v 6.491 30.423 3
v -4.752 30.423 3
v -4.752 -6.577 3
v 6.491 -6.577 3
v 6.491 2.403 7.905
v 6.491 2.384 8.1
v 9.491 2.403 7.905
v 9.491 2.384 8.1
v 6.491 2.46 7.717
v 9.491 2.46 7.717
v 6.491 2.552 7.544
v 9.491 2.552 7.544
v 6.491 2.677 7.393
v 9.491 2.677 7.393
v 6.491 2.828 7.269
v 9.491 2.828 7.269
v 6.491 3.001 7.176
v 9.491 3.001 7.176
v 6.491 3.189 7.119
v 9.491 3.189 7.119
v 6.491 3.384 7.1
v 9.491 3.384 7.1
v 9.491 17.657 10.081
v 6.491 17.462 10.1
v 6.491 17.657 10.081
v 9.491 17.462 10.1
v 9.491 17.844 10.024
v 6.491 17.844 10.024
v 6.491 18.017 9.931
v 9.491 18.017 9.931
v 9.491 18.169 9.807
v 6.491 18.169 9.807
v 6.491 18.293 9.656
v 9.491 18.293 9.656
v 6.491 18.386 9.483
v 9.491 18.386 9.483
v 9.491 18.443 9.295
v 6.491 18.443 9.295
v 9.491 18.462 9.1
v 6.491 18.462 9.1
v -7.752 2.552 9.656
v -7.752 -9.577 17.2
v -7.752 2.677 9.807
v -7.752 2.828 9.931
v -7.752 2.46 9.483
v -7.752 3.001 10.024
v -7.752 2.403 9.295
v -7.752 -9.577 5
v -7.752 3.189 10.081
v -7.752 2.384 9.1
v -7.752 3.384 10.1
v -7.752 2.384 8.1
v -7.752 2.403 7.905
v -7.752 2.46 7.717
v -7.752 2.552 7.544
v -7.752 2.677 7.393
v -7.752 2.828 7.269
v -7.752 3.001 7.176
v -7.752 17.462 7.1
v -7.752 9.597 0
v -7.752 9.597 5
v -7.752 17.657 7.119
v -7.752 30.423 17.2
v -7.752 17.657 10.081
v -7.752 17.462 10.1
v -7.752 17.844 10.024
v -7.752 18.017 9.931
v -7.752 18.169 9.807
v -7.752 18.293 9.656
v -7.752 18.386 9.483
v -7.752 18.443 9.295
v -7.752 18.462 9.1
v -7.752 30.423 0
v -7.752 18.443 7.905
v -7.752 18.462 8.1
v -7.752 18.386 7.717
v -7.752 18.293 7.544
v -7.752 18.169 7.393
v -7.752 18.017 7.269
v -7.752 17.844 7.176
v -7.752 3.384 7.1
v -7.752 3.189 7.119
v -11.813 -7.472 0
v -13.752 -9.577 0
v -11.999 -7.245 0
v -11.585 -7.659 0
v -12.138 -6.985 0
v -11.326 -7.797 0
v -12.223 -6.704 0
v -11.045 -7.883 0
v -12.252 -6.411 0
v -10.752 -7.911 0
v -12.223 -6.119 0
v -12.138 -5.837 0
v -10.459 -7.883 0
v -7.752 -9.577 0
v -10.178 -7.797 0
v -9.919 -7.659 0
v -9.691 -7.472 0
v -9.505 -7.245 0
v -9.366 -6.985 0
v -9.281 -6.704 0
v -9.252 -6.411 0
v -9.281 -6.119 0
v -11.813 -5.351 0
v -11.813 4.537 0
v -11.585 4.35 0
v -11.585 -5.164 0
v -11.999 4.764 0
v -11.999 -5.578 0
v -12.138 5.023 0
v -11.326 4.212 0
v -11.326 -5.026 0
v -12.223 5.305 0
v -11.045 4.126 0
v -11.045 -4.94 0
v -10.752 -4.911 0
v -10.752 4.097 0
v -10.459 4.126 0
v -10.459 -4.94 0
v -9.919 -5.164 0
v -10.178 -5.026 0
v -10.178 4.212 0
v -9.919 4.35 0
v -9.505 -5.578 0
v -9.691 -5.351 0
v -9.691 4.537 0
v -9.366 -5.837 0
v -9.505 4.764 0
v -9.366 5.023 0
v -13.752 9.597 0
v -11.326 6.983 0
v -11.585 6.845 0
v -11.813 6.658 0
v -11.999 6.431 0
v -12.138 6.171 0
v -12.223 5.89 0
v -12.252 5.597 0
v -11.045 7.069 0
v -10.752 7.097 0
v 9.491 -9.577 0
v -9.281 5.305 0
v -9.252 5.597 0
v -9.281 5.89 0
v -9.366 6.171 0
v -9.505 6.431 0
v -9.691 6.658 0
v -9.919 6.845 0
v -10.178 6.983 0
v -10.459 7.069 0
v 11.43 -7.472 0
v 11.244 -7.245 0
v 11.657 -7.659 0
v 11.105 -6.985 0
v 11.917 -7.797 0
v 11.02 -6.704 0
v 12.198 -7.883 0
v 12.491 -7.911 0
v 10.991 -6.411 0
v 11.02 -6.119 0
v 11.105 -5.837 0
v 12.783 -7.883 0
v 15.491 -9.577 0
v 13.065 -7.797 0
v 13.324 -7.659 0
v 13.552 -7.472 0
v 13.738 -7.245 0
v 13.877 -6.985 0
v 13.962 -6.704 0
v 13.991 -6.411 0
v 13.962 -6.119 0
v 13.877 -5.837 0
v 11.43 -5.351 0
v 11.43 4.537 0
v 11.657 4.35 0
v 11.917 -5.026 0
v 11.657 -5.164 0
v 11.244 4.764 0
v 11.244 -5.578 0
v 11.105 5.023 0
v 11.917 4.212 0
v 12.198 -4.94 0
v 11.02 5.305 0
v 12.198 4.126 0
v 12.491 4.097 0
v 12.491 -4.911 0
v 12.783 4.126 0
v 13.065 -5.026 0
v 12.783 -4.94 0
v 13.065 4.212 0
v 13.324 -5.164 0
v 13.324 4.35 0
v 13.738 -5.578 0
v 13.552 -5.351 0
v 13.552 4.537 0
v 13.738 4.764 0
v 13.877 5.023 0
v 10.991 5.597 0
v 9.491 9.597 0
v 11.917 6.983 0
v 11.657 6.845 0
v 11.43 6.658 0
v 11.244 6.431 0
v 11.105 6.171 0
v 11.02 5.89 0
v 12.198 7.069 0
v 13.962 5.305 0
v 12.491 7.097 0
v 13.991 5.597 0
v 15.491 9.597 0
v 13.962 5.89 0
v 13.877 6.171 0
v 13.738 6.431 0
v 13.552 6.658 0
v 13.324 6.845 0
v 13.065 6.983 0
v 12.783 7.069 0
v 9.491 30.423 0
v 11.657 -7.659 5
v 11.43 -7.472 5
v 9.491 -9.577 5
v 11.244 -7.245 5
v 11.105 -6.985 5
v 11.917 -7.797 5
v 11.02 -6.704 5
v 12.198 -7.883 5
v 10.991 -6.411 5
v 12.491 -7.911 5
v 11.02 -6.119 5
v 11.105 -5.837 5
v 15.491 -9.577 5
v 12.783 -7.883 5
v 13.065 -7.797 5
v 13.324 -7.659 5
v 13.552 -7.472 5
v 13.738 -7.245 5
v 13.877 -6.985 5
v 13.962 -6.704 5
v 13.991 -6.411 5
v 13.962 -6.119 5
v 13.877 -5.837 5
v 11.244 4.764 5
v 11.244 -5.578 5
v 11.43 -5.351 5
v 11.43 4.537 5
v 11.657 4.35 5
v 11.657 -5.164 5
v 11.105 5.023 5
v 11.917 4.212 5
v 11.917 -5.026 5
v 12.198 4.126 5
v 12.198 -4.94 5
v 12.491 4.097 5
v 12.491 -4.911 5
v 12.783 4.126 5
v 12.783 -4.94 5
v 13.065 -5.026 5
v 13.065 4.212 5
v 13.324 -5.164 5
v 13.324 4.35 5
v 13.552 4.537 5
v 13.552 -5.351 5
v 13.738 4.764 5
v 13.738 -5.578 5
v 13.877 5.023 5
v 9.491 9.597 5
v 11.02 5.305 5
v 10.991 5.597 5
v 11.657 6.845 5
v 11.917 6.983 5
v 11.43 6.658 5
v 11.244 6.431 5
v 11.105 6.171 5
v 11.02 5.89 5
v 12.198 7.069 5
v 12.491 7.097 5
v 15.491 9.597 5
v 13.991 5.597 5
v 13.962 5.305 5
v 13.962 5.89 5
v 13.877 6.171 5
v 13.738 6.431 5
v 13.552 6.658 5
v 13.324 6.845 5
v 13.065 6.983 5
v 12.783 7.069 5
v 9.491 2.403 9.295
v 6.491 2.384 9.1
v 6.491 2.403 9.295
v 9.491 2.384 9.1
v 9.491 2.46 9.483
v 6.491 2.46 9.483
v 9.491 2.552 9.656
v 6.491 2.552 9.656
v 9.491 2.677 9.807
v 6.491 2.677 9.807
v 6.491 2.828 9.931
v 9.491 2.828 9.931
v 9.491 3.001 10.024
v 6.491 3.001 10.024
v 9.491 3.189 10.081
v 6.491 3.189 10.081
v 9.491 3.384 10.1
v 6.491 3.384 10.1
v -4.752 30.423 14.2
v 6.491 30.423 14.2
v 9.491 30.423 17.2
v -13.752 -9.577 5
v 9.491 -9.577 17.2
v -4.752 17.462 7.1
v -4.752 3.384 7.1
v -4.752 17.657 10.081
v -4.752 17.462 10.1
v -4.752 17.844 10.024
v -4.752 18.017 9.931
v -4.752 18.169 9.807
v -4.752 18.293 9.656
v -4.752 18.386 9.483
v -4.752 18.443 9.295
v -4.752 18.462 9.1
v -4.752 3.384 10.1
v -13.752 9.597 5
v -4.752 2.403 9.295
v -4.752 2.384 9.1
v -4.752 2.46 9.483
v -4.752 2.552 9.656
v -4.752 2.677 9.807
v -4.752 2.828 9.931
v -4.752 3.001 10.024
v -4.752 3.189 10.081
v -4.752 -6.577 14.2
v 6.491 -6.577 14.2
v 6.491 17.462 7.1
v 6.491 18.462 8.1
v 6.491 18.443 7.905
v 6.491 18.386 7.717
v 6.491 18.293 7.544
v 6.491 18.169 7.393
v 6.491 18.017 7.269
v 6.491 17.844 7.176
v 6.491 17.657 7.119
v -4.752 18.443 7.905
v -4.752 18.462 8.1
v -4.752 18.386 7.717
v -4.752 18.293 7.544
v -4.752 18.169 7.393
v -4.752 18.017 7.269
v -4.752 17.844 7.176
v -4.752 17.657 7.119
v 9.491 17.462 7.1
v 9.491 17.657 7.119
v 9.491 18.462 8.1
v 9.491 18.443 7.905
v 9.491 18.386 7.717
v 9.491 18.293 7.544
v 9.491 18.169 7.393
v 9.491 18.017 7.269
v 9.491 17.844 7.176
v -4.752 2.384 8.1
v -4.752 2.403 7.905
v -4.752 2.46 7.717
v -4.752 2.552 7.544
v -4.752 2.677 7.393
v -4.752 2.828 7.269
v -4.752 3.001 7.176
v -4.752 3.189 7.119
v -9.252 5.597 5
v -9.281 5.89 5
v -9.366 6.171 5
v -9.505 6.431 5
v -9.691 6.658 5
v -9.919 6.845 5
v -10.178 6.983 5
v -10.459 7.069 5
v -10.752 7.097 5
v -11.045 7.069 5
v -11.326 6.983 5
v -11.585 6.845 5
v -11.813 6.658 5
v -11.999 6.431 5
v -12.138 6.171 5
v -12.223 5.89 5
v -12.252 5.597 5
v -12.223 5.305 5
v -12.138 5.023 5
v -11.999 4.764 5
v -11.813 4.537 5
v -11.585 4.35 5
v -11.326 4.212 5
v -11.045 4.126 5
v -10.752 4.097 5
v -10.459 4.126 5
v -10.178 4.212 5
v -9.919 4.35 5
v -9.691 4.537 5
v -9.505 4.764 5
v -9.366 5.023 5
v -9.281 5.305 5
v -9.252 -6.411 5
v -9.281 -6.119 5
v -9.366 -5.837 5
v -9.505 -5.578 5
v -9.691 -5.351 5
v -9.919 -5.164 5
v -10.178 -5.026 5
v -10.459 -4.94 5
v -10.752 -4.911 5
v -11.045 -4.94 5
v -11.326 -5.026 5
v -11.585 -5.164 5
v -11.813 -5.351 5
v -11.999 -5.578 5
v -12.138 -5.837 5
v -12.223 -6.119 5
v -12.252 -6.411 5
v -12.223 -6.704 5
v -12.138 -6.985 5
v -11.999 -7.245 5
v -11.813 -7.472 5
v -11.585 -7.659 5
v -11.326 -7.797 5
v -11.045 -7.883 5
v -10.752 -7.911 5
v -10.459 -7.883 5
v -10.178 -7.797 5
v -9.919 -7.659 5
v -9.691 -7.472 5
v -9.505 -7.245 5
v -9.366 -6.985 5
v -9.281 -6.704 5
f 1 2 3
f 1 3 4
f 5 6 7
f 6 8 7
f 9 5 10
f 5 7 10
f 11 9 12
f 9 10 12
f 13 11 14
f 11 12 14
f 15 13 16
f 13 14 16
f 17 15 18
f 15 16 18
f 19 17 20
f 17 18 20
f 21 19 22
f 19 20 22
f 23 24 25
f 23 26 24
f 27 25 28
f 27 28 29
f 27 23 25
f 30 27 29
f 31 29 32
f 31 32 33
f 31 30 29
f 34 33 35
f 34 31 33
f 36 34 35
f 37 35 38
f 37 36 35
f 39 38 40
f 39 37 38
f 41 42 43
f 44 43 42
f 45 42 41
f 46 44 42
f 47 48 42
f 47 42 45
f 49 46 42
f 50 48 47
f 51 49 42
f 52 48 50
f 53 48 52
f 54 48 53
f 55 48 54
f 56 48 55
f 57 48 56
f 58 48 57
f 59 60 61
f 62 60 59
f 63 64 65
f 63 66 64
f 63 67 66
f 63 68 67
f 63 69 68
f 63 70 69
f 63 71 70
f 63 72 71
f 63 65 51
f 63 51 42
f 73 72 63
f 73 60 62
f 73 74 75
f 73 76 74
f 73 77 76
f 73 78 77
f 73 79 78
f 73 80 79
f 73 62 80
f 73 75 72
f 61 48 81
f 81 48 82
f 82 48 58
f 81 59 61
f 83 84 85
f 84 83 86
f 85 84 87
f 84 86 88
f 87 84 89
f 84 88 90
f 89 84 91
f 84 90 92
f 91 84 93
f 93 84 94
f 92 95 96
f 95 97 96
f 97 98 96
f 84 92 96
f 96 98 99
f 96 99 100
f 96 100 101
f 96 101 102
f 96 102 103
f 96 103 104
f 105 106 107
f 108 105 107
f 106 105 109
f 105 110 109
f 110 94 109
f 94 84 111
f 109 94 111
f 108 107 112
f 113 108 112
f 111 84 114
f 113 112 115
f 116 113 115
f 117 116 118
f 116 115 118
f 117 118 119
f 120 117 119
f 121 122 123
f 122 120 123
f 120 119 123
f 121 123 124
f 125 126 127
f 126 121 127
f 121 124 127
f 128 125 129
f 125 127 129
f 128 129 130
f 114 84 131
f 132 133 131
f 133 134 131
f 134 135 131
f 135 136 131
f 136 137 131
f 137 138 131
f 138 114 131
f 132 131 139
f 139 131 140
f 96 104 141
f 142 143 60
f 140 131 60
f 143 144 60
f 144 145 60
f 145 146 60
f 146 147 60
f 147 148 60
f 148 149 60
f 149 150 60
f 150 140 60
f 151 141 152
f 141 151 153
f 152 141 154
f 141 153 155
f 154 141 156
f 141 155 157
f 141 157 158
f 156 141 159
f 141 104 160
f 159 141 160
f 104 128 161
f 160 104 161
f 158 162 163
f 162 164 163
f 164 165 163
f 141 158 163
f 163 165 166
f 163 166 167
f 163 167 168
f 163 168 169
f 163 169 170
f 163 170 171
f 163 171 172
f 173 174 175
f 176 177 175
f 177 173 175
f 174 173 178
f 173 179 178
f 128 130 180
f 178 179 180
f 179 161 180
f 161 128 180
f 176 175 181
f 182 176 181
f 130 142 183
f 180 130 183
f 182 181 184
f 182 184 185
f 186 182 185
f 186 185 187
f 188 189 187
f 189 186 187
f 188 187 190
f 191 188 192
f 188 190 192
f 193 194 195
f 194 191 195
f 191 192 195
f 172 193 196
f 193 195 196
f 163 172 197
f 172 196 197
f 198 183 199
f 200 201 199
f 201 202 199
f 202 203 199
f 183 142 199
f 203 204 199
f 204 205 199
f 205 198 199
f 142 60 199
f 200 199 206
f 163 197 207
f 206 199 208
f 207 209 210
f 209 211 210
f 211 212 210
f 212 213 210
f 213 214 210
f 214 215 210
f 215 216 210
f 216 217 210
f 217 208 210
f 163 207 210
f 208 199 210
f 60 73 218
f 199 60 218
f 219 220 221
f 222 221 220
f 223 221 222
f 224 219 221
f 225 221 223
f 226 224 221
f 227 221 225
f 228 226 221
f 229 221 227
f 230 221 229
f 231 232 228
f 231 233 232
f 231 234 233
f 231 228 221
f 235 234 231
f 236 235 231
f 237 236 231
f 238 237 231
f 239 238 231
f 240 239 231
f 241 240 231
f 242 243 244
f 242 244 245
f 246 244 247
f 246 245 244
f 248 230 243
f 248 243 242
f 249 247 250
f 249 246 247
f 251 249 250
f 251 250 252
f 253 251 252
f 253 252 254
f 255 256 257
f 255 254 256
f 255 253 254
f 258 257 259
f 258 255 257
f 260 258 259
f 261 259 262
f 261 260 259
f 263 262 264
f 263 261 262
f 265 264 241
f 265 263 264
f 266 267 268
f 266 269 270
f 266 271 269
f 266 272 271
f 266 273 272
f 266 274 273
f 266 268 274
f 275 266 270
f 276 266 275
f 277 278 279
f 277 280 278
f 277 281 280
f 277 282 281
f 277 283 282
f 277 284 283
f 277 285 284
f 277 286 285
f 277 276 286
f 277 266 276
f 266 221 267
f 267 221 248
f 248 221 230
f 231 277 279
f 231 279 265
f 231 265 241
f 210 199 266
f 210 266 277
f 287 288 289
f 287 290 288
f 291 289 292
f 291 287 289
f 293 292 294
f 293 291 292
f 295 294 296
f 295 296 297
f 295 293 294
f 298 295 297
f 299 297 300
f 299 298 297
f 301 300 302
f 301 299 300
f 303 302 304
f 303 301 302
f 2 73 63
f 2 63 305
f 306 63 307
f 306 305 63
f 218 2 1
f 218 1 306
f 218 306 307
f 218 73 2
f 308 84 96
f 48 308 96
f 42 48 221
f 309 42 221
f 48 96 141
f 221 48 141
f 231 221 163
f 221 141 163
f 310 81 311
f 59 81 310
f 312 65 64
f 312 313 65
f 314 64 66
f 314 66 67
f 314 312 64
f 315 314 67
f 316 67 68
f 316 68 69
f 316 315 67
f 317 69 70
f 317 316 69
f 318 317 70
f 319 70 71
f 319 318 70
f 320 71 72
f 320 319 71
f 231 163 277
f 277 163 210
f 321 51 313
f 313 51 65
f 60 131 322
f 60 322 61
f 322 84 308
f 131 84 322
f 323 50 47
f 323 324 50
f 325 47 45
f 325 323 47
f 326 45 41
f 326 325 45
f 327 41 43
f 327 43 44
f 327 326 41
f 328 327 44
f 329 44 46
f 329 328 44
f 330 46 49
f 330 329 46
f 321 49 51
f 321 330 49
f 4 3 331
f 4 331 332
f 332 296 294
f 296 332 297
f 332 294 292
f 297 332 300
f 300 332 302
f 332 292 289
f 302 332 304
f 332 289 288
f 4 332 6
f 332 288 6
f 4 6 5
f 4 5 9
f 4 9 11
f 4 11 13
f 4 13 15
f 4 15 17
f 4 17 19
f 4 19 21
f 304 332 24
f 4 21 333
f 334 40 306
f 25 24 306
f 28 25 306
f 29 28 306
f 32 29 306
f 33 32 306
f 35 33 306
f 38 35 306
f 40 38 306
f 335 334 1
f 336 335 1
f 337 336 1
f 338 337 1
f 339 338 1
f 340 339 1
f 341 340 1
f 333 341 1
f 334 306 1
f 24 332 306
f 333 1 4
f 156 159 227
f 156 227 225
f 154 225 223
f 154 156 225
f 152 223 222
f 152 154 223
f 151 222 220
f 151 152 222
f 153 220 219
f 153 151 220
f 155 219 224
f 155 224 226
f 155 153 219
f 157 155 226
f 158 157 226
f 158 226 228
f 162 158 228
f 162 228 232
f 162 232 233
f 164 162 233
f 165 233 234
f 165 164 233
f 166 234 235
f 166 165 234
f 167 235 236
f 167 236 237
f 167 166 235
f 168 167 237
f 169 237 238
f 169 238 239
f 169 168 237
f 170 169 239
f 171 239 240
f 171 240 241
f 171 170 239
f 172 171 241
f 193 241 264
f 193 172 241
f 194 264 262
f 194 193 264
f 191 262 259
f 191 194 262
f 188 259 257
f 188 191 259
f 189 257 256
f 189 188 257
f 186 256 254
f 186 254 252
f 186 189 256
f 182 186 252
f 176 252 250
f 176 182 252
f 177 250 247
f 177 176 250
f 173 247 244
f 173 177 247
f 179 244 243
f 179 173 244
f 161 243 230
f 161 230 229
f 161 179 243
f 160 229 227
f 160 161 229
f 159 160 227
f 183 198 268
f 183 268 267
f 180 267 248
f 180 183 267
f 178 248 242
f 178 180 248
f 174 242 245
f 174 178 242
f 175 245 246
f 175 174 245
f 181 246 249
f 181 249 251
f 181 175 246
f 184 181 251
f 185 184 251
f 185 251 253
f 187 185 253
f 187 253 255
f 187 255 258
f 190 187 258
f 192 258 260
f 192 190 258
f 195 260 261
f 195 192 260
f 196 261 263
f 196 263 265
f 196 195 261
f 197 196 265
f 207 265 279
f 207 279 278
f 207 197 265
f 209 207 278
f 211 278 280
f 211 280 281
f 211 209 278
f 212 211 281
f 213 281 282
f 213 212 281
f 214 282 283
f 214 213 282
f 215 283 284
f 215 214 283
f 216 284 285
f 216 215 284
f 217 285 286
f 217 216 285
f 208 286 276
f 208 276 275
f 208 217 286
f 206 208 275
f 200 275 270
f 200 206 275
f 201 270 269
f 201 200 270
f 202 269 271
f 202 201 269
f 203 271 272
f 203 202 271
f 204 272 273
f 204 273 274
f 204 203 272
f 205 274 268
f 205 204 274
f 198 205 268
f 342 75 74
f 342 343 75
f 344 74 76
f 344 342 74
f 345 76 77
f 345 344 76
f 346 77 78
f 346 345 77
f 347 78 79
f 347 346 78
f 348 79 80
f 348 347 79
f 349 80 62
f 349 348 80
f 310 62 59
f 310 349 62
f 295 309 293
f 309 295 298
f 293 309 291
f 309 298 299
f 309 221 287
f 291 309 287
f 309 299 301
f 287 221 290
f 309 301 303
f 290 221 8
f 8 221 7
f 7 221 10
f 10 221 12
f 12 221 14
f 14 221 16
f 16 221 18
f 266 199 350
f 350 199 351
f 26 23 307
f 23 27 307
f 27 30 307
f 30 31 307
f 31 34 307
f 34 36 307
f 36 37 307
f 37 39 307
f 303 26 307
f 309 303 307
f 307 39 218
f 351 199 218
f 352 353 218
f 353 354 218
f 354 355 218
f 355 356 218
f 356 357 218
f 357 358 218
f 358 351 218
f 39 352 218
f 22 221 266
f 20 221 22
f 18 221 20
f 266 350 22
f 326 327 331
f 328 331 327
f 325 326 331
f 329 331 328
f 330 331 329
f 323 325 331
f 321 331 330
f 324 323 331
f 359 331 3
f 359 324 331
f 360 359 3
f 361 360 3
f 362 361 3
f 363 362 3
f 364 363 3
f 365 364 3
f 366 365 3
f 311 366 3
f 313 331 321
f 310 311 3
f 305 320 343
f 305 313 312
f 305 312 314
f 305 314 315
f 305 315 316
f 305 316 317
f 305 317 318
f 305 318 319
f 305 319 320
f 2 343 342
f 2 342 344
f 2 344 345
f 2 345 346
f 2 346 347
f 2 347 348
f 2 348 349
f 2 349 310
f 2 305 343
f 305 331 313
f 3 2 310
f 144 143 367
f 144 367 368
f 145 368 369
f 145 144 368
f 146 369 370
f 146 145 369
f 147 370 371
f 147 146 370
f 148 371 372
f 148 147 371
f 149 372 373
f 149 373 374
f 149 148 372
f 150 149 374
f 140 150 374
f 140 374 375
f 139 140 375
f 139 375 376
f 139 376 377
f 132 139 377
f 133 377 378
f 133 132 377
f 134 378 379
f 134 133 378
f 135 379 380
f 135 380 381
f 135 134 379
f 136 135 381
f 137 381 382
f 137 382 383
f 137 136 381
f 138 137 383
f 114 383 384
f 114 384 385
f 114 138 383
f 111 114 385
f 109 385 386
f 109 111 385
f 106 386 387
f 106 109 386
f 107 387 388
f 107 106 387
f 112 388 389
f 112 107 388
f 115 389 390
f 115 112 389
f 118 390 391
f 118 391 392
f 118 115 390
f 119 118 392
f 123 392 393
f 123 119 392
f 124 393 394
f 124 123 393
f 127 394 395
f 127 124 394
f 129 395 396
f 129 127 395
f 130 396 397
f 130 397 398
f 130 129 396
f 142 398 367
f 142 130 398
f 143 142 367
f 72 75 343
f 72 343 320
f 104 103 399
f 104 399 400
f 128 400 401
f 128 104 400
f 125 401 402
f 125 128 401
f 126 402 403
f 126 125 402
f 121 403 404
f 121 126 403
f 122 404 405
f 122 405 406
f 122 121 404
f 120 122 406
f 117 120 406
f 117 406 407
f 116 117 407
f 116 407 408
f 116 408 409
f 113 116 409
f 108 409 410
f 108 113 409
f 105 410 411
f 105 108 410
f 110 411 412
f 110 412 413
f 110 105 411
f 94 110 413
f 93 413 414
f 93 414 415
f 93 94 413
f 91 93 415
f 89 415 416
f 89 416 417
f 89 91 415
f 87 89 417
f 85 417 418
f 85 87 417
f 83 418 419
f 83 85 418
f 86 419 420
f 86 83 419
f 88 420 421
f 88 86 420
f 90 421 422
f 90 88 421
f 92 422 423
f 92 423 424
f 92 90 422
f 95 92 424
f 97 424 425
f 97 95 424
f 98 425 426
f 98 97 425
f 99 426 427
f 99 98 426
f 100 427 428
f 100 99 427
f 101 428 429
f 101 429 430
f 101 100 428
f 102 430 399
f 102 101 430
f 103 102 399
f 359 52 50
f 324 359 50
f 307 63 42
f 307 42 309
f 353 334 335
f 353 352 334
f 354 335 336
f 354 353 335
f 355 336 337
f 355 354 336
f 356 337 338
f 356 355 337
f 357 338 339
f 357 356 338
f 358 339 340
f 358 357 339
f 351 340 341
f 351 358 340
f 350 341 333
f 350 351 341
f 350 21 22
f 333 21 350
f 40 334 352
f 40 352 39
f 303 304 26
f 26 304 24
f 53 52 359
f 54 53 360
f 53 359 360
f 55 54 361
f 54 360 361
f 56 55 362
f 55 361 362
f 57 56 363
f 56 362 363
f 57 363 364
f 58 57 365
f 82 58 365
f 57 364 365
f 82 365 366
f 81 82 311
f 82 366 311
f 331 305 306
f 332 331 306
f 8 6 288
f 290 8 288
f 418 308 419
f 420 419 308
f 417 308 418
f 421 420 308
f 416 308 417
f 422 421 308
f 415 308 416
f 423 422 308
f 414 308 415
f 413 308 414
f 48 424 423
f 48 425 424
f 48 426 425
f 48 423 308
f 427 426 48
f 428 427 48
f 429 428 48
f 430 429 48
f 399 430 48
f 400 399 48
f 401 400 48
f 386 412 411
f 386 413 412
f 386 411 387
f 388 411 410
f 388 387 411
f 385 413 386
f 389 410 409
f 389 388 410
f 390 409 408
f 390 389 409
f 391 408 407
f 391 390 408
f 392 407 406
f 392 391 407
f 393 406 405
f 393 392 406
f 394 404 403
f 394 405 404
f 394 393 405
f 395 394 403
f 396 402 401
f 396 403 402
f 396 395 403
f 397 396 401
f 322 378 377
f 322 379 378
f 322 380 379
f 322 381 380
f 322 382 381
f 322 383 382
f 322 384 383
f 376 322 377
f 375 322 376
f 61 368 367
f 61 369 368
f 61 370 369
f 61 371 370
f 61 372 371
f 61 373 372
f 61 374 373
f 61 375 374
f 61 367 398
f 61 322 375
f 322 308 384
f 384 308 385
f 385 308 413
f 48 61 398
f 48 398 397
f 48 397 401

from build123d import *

# Parameters (mm, degrees)
SKETCH7_W           = 17.242861366
SKETCH7_H           = 40
BOSS_EXTRUDE1_DEPTH = 17.2
SKETCH8_W           = 29.242861366
SKETCH8_H           = 19.174682453
BOSS_EXTRUDE2_DEPTH = 5
SKETCH10_W          = 11.242861366
SKETCH10_H          = 11.2
CUT_EXTRUDE2_DEPTH  = 37
CUT_EXTRUDE3_REACH  = 43.972
SKETCH11_W          = 3
SKETCH11_H          = 16.077949268
FILLET1_R           = 1
SKETCH12_R          = 1.5
CUT_EXTRUDE4_DEPTH  = 5


with BuildPart() as part:
    # Sketch7 → Boss-Extrude1 (new body)
    with BuildSketch(Plane.XY):
        with Locations((0.869412251, 10.42274338)):
            Rectangle(SKETCH7_W, SKETCH7_H)
    extrude(amount=BOSS_EXTRUDE1_DEPTH)

    # Sketch8 → Boss-Extrude2 (add)
    with BuildSketch(Plane.XY):
        with Locations((0.869412251, 0.010084607)):
            Rectangle(SKETCH8_W, SKETCH8_H)
    extrude(amount=BOSS_EXTRUDE2_DEPTH)

    # Sketch10 → Cut-Extrude2 (cut)
    with BuildSketch(Plane(origin=(0, 30.42274338, 0), x_dir=(1, 0, 0), z_dir=(0, 1, 0))):
        with Locations((0.869412251, -8.6)):
            Rectangle(SKETCH10_W, SKETCH10_H)
    extrude(amount=-CUT_EXTRUDE2_DEPTH, mode=Mode.SUBTRACT)

    # Cut-Extrude3: up to this face of the body (flat: up to its plane)
    cut_extrude3_end = Plane(part.part.faces().sort_by_distance((9.490842934, 12.108695587, 9.587673627))[0])
    # Sketch11 → Cut-Extrude3 (cut, up to the picked face)
    with BuildSketch(Plane.ZY.offset(7.752018432), mode=Mode.PRIVATE) as cut_extrude3_sk1:
        with Locations((8.6, 10.42274338)):
            Rectangle(SKETCH11_W, SKETCH11_H)
    cut_extrude3_tool1 = split(extrude(cut_extrude3_sk1.sketch, amount=-CUT_EXTRUDE3_REACH, mode=Mode.PRIVATE), bisect_by=cut_extrude3_end, keep=Keep.BOTH, mode=Mode.PRIVATE)
    add(cut_extrude3_tool1.solids().sort_by(Axis((-7.752018, 10.422743, 8.6), (1, 0, 0)))[0], mode=Mode.SUBTRACT)

    # Fillet1
    fillet1_edges = [part.edges().sort_by_distance(p)[0] for p in [
        (7.990842934, 18.461718014, 10.1),
        (-6.252018432, 18.461718014, 10.1),
        (7.990842934, 2.383768746, 10.1),
        (-6.252018432, 2.383768746, 10.1),
        (7.990842934, 2.383768746, 7.1),
        (-6.252018432, 2.383768746, 7.1),
        (7.990842934, 18.461718014, 7.1),
        (-6.252018432, 18.461718014, 7.1),
    ]]
    fillet(fillet1_edges, radius=FILLET1_R)

    # Sketch12 → Cut-Extrude4 (cut)
    with BuildSketch(Plane.XY):
        with Locations((-10.752018432, 5.597425833)):
            Circle(SKETCH12_R)
        with Locations((-10.752018432, -6.411460604)):
            Circle(SKETCH12_R)
        with Locations(Location((12.490842934, -6.411460604, 0), (0, 0, 180))):
            Circle(SKETCH12_R)
        with Locations(Location((12.490842934, 5.597425833, 0), (0, 0, 180))):
            Circle(SKETCH12_R)
    extrude(amount=CUT_EXTRUDE4_DEPTH, mode=Mode.SUBTRACT)


solid = part.part
